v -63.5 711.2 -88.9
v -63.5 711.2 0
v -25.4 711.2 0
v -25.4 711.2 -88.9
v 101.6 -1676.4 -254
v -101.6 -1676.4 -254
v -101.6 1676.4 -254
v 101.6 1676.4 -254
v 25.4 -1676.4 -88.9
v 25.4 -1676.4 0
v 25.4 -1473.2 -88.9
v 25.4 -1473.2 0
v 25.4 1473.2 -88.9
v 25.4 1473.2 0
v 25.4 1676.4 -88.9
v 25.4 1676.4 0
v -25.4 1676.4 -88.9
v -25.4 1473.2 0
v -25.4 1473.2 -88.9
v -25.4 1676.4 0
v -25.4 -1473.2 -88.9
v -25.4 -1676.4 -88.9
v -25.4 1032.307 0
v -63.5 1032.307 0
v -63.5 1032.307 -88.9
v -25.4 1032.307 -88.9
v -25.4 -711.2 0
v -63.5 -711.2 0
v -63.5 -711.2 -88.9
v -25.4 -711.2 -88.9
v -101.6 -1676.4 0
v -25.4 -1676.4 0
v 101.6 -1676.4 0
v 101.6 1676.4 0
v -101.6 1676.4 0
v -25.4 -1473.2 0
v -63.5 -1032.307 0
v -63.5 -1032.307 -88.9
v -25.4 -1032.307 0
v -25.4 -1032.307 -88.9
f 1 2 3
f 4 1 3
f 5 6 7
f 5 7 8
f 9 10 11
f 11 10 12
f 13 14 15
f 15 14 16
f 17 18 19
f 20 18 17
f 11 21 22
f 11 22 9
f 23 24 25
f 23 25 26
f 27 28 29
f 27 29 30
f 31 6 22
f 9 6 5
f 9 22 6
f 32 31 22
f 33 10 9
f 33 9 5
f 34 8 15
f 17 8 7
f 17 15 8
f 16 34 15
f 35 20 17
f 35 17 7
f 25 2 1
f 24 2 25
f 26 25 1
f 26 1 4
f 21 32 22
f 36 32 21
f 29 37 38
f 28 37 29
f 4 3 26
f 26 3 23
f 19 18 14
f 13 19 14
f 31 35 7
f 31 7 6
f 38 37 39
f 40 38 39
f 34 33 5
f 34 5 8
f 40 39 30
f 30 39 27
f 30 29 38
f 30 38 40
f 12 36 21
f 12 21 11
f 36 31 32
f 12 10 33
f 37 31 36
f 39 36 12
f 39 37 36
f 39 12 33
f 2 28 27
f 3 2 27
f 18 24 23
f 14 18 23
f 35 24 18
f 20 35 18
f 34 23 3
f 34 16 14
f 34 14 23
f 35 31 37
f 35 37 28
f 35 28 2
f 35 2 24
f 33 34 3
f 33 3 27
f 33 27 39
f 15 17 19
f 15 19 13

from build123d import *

# Parameters (mm, degrees)
F0_W     = 38.1
F0_H     = 321.1068
F0_W_2   = 50.8
F0_H_2   = 203.2
F1_DEPTH = 254
F2_DEPTH = 88.9


with BuildPart() as f1:
    # F0 (on Top) → F1 (new body)
    with BuildSketch(Plane.XY):
        Polygon((-25.4, 1676.4), (-101.6, 1676.4), (-101.6, -1676.4), (-25.4, -1676.4), (-25.4, -1473.2), (25.4, -1473.2), (25.4, -1676.4), (101.6, -1676.4), (101.6, 1676.4), (25.4, 1676.4), (25.4, 1473.2), (-25.4, 1473.2), align=None)
        with Locations((-44.45, -871.7534)):
            Rectangle(F0_W, F0_H, mode=Mode.SUBTRACT)
        with Locations((-44.45, 871.7534)):
            Rectangle(F0_W, F0_H, mode=Mode.SUBTRACT)
        with Locations((0, 1574.8)):
            Rectangle(F0_W_2, F0_H_2)
        with Locations((-44.45, 871.7534)):
            Rectangle(F0_W, F0_H)
        with Locations((-44.45, -871.7534)):
            Rectangle(F0_W, F0_H)
        with Locations((0, -1574.8)):
            Rectangle(F0_W_2, F0_H_2)
    extrude(amount=-F1_DEPTH)

    # F0 (on Top) → F2 (cut)
    with BuildSketch(Plane.XY):
        with Locations((0, -1574.8)):
            Rectangle(F0_W_2, F0_H_2)
        with Locations((-44.45, -871.7534)):
            Rectangle(F0_W, F0_H)
        with Locations((-44.45, 871.7534)):
            Rectangle(F0_W, F0_H)
        with Locations((0, 1574.8)):
            Rectangle(F0_W_2, F0_H_2)
    extrude(amount=-F2_DEPTH, mode=Mode.SUBTRACT)


solid = f1.part
